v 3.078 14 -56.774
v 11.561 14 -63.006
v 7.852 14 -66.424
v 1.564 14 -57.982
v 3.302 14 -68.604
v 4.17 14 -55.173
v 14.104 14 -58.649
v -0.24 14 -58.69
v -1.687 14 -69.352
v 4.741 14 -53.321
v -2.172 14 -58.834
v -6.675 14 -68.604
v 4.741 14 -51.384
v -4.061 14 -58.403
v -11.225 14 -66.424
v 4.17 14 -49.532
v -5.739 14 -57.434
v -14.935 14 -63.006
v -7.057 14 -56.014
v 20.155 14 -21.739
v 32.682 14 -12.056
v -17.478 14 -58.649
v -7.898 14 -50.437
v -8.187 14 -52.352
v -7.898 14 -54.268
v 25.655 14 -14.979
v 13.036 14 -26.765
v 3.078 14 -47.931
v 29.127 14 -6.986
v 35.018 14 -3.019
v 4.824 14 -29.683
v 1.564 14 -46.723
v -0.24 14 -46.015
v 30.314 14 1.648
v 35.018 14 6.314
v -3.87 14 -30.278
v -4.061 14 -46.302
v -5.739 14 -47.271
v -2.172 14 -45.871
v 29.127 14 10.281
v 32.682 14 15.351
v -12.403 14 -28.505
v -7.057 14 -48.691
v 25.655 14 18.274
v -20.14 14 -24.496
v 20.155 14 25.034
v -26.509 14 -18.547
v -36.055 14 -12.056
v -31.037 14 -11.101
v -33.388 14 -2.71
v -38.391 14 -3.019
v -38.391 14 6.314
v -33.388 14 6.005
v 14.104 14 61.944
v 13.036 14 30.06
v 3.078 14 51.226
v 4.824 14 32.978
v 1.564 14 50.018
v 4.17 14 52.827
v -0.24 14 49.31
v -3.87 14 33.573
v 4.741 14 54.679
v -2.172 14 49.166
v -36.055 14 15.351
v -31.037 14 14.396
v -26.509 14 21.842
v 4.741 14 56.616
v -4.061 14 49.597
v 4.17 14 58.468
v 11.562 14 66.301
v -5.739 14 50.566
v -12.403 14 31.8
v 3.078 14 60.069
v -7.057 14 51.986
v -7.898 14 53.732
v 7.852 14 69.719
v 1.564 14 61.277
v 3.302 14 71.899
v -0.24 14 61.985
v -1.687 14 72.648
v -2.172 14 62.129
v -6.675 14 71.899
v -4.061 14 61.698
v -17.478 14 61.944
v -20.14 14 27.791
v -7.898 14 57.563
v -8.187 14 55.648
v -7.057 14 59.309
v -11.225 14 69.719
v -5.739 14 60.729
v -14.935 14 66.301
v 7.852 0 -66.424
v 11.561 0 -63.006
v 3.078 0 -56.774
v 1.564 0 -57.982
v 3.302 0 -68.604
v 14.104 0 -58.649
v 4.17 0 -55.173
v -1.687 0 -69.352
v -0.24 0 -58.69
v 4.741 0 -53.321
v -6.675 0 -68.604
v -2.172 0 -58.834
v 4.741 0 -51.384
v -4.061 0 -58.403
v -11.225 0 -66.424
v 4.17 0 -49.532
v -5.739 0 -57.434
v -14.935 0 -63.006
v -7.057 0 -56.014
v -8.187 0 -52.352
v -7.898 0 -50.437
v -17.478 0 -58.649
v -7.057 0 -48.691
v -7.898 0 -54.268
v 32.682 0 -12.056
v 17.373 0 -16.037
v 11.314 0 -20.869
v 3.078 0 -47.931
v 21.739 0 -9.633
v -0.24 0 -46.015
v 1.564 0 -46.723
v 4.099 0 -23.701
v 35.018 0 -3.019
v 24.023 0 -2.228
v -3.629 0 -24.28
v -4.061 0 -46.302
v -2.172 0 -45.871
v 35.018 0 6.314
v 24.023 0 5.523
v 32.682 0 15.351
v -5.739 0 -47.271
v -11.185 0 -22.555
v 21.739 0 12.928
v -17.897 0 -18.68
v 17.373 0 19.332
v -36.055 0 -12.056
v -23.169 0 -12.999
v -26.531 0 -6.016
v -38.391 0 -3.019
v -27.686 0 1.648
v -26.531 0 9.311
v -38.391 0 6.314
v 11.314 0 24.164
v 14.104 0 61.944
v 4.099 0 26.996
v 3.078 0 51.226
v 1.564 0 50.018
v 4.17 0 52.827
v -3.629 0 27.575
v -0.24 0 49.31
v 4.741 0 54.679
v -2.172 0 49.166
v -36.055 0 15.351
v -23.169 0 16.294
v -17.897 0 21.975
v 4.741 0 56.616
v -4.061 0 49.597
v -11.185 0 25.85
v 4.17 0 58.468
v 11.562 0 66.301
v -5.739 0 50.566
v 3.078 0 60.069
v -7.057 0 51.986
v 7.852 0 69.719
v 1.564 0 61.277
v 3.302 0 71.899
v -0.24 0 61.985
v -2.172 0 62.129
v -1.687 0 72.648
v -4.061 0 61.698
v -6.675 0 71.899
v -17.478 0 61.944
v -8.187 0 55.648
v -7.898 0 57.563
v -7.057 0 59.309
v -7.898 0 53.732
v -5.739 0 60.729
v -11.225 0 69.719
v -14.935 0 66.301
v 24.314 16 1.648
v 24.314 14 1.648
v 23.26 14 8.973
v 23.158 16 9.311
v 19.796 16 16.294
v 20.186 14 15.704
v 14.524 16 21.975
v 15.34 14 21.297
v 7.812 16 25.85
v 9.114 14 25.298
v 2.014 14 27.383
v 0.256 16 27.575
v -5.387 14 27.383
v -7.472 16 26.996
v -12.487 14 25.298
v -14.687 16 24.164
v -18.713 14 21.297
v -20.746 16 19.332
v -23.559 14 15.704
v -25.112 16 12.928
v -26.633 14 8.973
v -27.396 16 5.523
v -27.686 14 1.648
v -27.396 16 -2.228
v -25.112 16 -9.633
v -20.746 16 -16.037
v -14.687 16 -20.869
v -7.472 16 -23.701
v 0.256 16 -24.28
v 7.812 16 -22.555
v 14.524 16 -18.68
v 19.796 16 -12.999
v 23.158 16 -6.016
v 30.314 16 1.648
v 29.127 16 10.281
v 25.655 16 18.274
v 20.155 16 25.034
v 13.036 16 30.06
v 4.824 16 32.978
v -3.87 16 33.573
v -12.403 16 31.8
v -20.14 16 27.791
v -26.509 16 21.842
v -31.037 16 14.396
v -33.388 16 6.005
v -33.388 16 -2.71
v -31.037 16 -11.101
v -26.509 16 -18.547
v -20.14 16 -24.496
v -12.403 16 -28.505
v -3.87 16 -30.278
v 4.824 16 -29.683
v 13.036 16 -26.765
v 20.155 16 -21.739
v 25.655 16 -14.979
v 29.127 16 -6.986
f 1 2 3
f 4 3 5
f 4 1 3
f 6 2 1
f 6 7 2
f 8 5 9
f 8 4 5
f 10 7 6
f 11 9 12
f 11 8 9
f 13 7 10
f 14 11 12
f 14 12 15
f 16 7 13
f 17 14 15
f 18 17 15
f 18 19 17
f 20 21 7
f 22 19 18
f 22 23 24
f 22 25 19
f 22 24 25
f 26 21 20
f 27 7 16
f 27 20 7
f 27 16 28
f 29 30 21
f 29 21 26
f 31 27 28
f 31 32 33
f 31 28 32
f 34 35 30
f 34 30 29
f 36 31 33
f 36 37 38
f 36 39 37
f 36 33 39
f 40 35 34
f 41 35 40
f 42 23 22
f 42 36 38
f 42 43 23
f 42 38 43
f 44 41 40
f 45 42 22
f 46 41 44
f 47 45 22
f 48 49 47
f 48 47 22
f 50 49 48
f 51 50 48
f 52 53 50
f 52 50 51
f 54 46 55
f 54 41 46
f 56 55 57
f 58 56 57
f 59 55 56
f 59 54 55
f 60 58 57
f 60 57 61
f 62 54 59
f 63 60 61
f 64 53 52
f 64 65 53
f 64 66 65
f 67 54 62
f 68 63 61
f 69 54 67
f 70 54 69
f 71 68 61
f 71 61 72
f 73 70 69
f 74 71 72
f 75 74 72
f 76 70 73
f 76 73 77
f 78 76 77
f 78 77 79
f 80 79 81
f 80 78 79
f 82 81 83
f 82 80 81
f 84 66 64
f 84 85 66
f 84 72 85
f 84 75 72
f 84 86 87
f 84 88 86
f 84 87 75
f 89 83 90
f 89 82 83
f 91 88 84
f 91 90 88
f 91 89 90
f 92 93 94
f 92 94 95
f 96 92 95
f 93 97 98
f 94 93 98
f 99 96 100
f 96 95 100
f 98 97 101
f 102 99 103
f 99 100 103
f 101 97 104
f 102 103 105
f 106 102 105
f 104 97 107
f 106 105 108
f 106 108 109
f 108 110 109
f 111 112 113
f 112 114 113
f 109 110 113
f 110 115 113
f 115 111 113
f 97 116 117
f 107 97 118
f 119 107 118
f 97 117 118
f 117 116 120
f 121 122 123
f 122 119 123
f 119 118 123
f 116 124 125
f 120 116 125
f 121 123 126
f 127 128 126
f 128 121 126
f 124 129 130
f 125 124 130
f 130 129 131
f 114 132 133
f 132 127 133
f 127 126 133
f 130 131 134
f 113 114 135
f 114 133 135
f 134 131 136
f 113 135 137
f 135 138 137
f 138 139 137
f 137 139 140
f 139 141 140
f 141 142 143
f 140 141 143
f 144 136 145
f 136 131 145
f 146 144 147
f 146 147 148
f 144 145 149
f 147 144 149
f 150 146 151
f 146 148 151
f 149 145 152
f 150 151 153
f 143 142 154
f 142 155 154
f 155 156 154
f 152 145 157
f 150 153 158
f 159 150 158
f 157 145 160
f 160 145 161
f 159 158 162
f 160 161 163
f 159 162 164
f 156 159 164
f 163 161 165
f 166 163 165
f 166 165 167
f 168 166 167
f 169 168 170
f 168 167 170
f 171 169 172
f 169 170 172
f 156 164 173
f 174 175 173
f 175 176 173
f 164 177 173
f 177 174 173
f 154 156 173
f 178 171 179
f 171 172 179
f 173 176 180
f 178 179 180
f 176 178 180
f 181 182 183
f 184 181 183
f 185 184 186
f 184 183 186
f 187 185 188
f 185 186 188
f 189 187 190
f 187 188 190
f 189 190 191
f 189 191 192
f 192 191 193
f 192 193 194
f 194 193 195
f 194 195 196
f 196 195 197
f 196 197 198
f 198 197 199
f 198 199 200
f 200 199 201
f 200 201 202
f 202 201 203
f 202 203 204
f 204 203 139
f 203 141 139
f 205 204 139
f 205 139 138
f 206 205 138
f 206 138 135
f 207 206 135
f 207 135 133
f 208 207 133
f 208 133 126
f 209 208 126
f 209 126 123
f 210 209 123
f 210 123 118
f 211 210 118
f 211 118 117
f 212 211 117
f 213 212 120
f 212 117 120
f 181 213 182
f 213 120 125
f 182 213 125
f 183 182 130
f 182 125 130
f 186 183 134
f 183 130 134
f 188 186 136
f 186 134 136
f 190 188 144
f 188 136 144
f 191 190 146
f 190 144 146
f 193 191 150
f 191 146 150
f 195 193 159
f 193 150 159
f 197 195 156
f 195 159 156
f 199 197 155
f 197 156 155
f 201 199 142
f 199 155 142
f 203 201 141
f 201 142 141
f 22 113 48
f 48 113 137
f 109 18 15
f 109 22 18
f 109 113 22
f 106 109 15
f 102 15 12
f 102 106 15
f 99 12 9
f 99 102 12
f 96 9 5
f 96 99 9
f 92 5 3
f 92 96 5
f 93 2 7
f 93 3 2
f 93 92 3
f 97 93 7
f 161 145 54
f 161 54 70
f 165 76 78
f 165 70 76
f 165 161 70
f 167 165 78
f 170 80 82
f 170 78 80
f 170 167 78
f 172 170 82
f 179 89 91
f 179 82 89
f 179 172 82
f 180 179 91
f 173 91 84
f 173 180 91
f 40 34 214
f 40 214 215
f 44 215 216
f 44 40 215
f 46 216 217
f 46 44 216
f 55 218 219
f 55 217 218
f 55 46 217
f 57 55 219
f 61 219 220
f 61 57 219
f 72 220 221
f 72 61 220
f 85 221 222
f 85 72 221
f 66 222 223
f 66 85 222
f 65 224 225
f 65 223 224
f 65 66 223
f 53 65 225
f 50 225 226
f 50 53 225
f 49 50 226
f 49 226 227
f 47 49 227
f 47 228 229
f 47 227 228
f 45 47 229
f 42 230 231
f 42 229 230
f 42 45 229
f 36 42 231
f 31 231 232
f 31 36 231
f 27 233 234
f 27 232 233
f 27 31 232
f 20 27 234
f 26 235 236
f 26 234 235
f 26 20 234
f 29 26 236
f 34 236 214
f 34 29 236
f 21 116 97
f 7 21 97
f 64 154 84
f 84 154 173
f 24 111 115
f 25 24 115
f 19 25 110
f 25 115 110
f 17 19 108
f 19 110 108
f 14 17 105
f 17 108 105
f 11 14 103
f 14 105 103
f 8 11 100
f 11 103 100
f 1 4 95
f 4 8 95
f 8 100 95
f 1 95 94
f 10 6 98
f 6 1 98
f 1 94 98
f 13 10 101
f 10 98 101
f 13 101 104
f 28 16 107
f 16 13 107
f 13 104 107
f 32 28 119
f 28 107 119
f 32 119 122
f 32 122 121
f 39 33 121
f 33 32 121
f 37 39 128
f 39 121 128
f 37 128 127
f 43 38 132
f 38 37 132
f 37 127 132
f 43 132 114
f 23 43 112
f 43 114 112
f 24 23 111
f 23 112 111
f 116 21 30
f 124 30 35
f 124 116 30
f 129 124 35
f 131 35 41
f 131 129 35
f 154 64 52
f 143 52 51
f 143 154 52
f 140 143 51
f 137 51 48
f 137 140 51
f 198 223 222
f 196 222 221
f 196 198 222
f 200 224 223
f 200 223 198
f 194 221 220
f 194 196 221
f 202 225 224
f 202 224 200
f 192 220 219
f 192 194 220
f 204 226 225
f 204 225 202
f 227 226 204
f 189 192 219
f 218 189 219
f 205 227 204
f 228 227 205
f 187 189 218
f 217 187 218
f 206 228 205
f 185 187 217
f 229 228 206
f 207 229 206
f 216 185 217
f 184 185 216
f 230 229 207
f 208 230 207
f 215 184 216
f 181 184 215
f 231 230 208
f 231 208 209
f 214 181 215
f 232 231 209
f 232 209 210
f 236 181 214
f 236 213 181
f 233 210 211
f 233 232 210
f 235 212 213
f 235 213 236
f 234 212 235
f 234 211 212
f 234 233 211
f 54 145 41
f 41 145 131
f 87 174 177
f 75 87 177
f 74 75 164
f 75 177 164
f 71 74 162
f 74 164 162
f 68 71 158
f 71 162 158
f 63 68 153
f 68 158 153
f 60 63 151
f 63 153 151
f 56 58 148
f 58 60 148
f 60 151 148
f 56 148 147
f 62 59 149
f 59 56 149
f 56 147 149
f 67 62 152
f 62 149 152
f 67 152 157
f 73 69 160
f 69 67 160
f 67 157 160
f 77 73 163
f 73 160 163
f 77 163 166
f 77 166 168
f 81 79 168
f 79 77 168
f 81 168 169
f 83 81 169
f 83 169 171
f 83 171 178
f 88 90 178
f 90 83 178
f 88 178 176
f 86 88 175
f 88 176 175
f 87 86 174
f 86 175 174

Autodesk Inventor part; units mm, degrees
ref_plane "YZ Plane" through (0, 0, 0) normal (1, 0, 0) x (0, 1, 0)
ref_plane "XZ Plane" through (0, 0, 0) normal (0, 1, 0) x (-1, 0, 0)
ref_plane "XY Plane" through (0, 0, 0) normal (0, 0, 1) x (1, 0, 0)
sketch "Sketch1" plane through (0, 0, 0) normal (0, 1, 0) x (-1, 0, 0)
  arc A0 (17.4776, 61.9438) -> (-14.1045, 61.9438) centre (1.6865, 55.6475) ccw
  arc A1 (-14.1045, -58.6488) -> (17.4776, -58.6488) centre (1.6865, -52.3525) ccw
  line L0 (36.0552, 15.3512) -> (17.4776, 61.9438)
  line L1 (-14.1045, 61.9438) -> (-32.6822, 15.3512)
  line L2 (-32.6822, -12.0562) -> (-14.1045, -58.6488)
  line L3 (17.4776, -58.6488) -> (36.0552, -12.0562)
  arc A2 (-32.6822, 15.3512) -> (-32.6822, -12.0562) centre (1.6865, 1.6475) ccw
  arc A3 (36.0552, -12.0562) -> (36.0552, 15.3512) centre (1.6865, 1.6475) ccw
  circle A4 centre (1.6865, 55.6475) radius 6.5
  circle A5 centre (1.6865, -52.3525) radius 6.5
  circle A6 centre (1.6865, 1.6475) radius 26
  dimension "d11" = 13
  dimension "d12" = 13
  dimension "d13" = 52
extrude "Extrusion1" add sketch "Sketch1" along normal blind 14
sketch "Sketch2" plane through (0, 14, 0) normal (0, 1, 0) x (1, 0, 0)
  circle A0 centre (-1.6865, -1.6475) radius 26 projected
  circle A1 centre (-1.6865, -1.6475) radius 32
  point P0 (0, 0)
  dimension "d16" = 64
extrude "Extrusion2" add sketch "Sketch2" along normal blind 2
properties part number "00.32.011 \"Flange\""
